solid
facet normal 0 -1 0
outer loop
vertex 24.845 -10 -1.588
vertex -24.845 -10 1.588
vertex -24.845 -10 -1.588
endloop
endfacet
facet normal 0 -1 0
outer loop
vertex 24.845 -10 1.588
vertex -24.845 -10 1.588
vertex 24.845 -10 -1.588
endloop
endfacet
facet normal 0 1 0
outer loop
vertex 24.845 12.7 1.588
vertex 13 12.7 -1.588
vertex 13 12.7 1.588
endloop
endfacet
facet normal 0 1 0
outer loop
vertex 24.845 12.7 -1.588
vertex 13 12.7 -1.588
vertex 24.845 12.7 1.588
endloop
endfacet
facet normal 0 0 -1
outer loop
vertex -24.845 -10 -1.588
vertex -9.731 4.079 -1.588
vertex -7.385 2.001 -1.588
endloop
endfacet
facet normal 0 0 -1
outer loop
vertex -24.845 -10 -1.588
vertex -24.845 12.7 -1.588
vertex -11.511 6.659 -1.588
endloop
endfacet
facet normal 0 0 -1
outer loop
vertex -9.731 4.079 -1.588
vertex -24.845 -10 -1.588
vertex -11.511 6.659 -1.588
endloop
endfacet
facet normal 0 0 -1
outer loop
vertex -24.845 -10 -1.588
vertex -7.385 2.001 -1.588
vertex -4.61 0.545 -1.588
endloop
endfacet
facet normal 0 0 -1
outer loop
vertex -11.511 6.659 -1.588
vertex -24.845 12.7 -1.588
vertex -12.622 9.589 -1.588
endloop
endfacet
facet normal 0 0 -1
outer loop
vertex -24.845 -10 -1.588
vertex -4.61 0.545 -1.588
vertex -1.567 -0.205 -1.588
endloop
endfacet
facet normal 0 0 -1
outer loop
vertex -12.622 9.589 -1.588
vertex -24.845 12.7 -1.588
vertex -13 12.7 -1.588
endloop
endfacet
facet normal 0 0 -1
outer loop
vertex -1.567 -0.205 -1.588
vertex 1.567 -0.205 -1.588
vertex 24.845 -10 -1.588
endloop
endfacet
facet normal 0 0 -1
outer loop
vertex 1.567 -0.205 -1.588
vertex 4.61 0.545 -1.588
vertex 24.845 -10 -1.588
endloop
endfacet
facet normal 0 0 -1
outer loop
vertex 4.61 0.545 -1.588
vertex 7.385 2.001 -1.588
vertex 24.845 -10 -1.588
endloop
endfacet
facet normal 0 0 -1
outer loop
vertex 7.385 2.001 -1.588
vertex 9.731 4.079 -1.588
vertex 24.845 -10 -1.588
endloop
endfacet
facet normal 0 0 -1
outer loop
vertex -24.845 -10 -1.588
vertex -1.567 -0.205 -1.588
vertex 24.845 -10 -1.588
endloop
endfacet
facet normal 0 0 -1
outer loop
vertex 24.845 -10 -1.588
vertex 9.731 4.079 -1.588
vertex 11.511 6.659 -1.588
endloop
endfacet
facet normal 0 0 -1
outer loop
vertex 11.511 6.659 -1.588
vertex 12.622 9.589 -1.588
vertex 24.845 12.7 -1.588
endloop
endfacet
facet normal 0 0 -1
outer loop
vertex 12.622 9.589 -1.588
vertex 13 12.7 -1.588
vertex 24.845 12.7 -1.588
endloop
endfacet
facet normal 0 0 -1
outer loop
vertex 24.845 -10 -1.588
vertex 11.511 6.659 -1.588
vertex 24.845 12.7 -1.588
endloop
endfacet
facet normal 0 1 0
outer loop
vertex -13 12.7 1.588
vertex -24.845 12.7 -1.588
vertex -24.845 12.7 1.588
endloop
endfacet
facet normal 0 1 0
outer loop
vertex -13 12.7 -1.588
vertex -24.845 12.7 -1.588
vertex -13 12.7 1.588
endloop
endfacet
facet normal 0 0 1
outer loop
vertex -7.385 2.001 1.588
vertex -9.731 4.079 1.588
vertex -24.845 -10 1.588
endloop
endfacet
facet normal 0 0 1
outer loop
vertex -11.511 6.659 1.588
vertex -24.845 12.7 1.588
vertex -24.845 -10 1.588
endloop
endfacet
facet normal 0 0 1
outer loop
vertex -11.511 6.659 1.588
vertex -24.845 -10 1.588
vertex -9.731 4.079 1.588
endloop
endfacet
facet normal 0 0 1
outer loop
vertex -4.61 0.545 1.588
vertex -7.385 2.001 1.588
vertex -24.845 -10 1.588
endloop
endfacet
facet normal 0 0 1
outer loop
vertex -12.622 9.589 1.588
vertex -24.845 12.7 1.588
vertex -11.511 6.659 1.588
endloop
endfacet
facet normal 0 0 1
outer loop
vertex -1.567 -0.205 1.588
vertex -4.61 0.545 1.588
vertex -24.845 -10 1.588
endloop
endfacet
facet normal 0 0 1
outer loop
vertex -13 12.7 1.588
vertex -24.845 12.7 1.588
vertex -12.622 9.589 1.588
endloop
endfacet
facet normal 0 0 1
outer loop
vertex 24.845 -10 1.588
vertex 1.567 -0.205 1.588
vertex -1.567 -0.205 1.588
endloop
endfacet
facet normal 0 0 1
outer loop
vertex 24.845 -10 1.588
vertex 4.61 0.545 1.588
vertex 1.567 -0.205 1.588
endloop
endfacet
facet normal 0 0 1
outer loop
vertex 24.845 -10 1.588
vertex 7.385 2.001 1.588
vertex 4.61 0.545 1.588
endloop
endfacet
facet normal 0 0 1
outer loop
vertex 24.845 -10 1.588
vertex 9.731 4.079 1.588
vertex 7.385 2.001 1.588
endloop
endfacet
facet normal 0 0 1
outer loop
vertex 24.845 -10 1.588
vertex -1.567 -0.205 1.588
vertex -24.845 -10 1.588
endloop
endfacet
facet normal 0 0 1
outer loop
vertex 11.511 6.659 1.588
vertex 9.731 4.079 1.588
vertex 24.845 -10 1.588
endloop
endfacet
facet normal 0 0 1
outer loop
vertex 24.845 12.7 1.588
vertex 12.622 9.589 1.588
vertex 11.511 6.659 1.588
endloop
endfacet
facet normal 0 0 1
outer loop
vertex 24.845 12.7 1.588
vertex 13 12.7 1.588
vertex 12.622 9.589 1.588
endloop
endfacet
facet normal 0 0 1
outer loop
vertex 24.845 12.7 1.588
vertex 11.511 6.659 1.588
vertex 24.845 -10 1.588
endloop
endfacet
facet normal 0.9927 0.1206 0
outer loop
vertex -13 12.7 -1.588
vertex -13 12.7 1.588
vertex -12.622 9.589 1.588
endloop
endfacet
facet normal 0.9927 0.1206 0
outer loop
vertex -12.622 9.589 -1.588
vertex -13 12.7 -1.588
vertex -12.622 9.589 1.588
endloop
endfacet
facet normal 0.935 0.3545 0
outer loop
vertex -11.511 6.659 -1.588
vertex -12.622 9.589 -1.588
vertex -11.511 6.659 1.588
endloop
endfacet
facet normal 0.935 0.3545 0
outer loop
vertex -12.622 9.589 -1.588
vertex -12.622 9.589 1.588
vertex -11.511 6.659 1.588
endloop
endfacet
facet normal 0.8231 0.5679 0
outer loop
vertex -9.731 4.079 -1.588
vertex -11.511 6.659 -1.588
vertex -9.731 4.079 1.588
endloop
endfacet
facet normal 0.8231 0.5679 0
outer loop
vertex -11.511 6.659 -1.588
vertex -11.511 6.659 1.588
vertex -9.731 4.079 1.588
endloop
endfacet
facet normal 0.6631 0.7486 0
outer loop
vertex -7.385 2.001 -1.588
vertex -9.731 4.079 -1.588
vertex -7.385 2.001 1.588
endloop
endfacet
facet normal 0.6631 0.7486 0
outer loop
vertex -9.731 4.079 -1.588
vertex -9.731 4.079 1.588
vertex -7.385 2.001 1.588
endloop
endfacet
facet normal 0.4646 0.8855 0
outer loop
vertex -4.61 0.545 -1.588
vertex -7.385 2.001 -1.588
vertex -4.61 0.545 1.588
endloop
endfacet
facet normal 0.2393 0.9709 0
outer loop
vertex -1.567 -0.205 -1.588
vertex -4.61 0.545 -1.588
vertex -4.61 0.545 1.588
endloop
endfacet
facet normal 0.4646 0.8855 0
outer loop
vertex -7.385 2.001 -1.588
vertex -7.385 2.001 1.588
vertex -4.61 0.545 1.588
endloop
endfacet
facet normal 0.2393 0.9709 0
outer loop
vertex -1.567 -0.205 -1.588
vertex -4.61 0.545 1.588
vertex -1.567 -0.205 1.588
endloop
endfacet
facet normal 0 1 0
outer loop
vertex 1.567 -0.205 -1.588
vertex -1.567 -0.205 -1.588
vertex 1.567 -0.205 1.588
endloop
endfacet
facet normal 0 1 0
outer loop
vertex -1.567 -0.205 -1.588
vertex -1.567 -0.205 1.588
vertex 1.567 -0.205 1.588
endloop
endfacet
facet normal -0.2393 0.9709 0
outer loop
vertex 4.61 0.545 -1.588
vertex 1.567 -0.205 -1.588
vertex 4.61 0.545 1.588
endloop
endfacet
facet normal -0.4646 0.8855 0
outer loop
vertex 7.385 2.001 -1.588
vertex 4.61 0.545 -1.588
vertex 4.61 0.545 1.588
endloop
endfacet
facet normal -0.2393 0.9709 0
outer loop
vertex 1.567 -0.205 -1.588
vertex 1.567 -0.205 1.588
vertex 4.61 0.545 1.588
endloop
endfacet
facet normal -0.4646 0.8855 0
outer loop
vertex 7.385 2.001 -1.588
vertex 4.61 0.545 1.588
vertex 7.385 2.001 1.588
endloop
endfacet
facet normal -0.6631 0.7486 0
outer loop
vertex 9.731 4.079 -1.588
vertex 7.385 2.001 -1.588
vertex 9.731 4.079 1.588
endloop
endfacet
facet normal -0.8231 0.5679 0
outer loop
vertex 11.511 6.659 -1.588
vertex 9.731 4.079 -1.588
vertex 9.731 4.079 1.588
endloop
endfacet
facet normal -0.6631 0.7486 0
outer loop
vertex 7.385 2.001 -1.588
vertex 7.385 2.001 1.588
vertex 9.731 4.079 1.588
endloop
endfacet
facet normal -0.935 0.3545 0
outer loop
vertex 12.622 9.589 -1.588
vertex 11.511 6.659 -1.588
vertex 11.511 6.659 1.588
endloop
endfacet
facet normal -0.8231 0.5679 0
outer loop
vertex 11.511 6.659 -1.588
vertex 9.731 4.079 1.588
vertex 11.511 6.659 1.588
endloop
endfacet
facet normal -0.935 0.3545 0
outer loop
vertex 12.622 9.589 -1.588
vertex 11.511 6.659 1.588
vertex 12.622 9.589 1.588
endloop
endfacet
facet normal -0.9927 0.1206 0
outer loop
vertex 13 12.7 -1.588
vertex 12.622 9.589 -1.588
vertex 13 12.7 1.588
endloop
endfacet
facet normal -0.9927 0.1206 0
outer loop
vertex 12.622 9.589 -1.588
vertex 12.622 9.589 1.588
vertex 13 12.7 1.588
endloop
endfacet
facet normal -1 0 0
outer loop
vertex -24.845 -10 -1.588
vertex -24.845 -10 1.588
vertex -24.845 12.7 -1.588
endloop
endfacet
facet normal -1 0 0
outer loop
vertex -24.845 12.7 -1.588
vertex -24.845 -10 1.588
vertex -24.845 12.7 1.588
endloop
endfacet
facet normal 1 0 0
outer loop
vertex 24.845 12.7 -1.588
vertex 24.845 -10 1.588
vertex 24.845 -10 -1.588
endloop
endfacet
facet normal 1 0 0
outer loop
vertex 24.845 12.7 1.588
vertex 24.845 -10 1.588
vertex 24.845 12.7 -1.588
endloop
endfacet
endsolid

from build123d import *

# Parameters (mm, degrees)
SKETCH1_W                = 39.69
SKETCH1_H                = 3.175
BOSS_EXTRUDE2_DEPTH      = 12.7
CUT_EXTRUDE1_DEPTH       = 12.7
BOSS_EXTRUDE3_DEPTH      = 1.5875
BOSS_EXTRUDE3_DEPTH_BACK = 1.5875
SKETCH5_W                = 5
SKETCH5_H                = 12.7
SKETCH6_W                = 49.69
SKETCH6_H                = 5
BOSS_EXTRUDE4_DEPTH      = 3.175
CUT_EXTRUDE2_DEPTH       = 3.175
SKETCH8_W                = 49.69
SKETCH8_H                = 5
BOSS_EXTRUDE5_DEPTH      = 3.175


with BuildPart() as part:
    # Sketch1 → Boss-Extrude2 (new body)
    with BuildSketch(Plane(origin=(0, 0, 0), x_dir=(1, 0, 0), z_dir=(0, 1, 0))):
        Rectangle(SKETCH1_W, SKETCH1_H)
    extrude(amount=BOSS_EXTRUDE2_DEPTH)

    # Sketch3 → Cut-Extrude1 (cut)
    with BuildSketch(Plane.XY.offset(1.5875)):
        with BuildLine():
            Line((-11, 12.7), (11, 12.7))
            ThreePointArc((11, 12.7), (0, 1.7), (-11, 12.7))
        make_face()
    extrude(amount=-CUT_EXTRUDE1_DEPTH, mode=Mode.SUBTRACT)

    # Sketch5 → Boss-Extrude3 (add, two sides: drawn at the far end of the back side and taken through both)
    with BuildSketch(Plane.XY.offset(-BOSS_EXTRUDE3_DEPTH_BACK)):
        with Locations((22.345, 6.35)):
            Rectangle(SKETCH5_W, SKETCH5_H)
        with Locations((-22.345, 6.35)):
            Rectangle(SKETCH5_W, SKETCH5_H)
    extrude(amount=BOSS_EXTRUDE3_DEPTH + BOSS_EXTRUDE3_DEPTH_BACK)

    # Sketch6 → Boss-Extrude4 (add)
    with BuildSketch(Plane.XY.offset(1.5875)):
        with Locations((0, -2.5)):
            Rectangle(SKETCH6_W, SKETCH6_H)
    extrude(amount=-BOSS_EXTRUDE4_DEPTH)

    # Sketch7 → Cut-Extrude2 (cut)
    with BuildSketch(Plane.XY.offset(1.5875)):
        with BuildLine():
            ThreePointArc((11, 12.7), (0, 1.7), (-11, 12.7))
            Line((-11, 12.7), (-13, 12.7))
            ThreePointArc((-13, 12.7), (0, -0.3), (13, 12.7))
            Line((13, 12.7), (11, 12.7))
        make_face()
    extrude(amount=-CUT_EXTRUDE2_DEPTH, mode=Mode.SUBTRACT)

    # Sketch8 → Boss-Extrude5 (add)
    with BuildSketch(Plane.XY.offset(1.5875)):
        with Locations((0, -7.5)):
            Rectangle(SKETCH8_W, SKETCH8_H)
    extrude(amount=-BOSS_EXTRUDE5_DEPTH)


solid = part.part
